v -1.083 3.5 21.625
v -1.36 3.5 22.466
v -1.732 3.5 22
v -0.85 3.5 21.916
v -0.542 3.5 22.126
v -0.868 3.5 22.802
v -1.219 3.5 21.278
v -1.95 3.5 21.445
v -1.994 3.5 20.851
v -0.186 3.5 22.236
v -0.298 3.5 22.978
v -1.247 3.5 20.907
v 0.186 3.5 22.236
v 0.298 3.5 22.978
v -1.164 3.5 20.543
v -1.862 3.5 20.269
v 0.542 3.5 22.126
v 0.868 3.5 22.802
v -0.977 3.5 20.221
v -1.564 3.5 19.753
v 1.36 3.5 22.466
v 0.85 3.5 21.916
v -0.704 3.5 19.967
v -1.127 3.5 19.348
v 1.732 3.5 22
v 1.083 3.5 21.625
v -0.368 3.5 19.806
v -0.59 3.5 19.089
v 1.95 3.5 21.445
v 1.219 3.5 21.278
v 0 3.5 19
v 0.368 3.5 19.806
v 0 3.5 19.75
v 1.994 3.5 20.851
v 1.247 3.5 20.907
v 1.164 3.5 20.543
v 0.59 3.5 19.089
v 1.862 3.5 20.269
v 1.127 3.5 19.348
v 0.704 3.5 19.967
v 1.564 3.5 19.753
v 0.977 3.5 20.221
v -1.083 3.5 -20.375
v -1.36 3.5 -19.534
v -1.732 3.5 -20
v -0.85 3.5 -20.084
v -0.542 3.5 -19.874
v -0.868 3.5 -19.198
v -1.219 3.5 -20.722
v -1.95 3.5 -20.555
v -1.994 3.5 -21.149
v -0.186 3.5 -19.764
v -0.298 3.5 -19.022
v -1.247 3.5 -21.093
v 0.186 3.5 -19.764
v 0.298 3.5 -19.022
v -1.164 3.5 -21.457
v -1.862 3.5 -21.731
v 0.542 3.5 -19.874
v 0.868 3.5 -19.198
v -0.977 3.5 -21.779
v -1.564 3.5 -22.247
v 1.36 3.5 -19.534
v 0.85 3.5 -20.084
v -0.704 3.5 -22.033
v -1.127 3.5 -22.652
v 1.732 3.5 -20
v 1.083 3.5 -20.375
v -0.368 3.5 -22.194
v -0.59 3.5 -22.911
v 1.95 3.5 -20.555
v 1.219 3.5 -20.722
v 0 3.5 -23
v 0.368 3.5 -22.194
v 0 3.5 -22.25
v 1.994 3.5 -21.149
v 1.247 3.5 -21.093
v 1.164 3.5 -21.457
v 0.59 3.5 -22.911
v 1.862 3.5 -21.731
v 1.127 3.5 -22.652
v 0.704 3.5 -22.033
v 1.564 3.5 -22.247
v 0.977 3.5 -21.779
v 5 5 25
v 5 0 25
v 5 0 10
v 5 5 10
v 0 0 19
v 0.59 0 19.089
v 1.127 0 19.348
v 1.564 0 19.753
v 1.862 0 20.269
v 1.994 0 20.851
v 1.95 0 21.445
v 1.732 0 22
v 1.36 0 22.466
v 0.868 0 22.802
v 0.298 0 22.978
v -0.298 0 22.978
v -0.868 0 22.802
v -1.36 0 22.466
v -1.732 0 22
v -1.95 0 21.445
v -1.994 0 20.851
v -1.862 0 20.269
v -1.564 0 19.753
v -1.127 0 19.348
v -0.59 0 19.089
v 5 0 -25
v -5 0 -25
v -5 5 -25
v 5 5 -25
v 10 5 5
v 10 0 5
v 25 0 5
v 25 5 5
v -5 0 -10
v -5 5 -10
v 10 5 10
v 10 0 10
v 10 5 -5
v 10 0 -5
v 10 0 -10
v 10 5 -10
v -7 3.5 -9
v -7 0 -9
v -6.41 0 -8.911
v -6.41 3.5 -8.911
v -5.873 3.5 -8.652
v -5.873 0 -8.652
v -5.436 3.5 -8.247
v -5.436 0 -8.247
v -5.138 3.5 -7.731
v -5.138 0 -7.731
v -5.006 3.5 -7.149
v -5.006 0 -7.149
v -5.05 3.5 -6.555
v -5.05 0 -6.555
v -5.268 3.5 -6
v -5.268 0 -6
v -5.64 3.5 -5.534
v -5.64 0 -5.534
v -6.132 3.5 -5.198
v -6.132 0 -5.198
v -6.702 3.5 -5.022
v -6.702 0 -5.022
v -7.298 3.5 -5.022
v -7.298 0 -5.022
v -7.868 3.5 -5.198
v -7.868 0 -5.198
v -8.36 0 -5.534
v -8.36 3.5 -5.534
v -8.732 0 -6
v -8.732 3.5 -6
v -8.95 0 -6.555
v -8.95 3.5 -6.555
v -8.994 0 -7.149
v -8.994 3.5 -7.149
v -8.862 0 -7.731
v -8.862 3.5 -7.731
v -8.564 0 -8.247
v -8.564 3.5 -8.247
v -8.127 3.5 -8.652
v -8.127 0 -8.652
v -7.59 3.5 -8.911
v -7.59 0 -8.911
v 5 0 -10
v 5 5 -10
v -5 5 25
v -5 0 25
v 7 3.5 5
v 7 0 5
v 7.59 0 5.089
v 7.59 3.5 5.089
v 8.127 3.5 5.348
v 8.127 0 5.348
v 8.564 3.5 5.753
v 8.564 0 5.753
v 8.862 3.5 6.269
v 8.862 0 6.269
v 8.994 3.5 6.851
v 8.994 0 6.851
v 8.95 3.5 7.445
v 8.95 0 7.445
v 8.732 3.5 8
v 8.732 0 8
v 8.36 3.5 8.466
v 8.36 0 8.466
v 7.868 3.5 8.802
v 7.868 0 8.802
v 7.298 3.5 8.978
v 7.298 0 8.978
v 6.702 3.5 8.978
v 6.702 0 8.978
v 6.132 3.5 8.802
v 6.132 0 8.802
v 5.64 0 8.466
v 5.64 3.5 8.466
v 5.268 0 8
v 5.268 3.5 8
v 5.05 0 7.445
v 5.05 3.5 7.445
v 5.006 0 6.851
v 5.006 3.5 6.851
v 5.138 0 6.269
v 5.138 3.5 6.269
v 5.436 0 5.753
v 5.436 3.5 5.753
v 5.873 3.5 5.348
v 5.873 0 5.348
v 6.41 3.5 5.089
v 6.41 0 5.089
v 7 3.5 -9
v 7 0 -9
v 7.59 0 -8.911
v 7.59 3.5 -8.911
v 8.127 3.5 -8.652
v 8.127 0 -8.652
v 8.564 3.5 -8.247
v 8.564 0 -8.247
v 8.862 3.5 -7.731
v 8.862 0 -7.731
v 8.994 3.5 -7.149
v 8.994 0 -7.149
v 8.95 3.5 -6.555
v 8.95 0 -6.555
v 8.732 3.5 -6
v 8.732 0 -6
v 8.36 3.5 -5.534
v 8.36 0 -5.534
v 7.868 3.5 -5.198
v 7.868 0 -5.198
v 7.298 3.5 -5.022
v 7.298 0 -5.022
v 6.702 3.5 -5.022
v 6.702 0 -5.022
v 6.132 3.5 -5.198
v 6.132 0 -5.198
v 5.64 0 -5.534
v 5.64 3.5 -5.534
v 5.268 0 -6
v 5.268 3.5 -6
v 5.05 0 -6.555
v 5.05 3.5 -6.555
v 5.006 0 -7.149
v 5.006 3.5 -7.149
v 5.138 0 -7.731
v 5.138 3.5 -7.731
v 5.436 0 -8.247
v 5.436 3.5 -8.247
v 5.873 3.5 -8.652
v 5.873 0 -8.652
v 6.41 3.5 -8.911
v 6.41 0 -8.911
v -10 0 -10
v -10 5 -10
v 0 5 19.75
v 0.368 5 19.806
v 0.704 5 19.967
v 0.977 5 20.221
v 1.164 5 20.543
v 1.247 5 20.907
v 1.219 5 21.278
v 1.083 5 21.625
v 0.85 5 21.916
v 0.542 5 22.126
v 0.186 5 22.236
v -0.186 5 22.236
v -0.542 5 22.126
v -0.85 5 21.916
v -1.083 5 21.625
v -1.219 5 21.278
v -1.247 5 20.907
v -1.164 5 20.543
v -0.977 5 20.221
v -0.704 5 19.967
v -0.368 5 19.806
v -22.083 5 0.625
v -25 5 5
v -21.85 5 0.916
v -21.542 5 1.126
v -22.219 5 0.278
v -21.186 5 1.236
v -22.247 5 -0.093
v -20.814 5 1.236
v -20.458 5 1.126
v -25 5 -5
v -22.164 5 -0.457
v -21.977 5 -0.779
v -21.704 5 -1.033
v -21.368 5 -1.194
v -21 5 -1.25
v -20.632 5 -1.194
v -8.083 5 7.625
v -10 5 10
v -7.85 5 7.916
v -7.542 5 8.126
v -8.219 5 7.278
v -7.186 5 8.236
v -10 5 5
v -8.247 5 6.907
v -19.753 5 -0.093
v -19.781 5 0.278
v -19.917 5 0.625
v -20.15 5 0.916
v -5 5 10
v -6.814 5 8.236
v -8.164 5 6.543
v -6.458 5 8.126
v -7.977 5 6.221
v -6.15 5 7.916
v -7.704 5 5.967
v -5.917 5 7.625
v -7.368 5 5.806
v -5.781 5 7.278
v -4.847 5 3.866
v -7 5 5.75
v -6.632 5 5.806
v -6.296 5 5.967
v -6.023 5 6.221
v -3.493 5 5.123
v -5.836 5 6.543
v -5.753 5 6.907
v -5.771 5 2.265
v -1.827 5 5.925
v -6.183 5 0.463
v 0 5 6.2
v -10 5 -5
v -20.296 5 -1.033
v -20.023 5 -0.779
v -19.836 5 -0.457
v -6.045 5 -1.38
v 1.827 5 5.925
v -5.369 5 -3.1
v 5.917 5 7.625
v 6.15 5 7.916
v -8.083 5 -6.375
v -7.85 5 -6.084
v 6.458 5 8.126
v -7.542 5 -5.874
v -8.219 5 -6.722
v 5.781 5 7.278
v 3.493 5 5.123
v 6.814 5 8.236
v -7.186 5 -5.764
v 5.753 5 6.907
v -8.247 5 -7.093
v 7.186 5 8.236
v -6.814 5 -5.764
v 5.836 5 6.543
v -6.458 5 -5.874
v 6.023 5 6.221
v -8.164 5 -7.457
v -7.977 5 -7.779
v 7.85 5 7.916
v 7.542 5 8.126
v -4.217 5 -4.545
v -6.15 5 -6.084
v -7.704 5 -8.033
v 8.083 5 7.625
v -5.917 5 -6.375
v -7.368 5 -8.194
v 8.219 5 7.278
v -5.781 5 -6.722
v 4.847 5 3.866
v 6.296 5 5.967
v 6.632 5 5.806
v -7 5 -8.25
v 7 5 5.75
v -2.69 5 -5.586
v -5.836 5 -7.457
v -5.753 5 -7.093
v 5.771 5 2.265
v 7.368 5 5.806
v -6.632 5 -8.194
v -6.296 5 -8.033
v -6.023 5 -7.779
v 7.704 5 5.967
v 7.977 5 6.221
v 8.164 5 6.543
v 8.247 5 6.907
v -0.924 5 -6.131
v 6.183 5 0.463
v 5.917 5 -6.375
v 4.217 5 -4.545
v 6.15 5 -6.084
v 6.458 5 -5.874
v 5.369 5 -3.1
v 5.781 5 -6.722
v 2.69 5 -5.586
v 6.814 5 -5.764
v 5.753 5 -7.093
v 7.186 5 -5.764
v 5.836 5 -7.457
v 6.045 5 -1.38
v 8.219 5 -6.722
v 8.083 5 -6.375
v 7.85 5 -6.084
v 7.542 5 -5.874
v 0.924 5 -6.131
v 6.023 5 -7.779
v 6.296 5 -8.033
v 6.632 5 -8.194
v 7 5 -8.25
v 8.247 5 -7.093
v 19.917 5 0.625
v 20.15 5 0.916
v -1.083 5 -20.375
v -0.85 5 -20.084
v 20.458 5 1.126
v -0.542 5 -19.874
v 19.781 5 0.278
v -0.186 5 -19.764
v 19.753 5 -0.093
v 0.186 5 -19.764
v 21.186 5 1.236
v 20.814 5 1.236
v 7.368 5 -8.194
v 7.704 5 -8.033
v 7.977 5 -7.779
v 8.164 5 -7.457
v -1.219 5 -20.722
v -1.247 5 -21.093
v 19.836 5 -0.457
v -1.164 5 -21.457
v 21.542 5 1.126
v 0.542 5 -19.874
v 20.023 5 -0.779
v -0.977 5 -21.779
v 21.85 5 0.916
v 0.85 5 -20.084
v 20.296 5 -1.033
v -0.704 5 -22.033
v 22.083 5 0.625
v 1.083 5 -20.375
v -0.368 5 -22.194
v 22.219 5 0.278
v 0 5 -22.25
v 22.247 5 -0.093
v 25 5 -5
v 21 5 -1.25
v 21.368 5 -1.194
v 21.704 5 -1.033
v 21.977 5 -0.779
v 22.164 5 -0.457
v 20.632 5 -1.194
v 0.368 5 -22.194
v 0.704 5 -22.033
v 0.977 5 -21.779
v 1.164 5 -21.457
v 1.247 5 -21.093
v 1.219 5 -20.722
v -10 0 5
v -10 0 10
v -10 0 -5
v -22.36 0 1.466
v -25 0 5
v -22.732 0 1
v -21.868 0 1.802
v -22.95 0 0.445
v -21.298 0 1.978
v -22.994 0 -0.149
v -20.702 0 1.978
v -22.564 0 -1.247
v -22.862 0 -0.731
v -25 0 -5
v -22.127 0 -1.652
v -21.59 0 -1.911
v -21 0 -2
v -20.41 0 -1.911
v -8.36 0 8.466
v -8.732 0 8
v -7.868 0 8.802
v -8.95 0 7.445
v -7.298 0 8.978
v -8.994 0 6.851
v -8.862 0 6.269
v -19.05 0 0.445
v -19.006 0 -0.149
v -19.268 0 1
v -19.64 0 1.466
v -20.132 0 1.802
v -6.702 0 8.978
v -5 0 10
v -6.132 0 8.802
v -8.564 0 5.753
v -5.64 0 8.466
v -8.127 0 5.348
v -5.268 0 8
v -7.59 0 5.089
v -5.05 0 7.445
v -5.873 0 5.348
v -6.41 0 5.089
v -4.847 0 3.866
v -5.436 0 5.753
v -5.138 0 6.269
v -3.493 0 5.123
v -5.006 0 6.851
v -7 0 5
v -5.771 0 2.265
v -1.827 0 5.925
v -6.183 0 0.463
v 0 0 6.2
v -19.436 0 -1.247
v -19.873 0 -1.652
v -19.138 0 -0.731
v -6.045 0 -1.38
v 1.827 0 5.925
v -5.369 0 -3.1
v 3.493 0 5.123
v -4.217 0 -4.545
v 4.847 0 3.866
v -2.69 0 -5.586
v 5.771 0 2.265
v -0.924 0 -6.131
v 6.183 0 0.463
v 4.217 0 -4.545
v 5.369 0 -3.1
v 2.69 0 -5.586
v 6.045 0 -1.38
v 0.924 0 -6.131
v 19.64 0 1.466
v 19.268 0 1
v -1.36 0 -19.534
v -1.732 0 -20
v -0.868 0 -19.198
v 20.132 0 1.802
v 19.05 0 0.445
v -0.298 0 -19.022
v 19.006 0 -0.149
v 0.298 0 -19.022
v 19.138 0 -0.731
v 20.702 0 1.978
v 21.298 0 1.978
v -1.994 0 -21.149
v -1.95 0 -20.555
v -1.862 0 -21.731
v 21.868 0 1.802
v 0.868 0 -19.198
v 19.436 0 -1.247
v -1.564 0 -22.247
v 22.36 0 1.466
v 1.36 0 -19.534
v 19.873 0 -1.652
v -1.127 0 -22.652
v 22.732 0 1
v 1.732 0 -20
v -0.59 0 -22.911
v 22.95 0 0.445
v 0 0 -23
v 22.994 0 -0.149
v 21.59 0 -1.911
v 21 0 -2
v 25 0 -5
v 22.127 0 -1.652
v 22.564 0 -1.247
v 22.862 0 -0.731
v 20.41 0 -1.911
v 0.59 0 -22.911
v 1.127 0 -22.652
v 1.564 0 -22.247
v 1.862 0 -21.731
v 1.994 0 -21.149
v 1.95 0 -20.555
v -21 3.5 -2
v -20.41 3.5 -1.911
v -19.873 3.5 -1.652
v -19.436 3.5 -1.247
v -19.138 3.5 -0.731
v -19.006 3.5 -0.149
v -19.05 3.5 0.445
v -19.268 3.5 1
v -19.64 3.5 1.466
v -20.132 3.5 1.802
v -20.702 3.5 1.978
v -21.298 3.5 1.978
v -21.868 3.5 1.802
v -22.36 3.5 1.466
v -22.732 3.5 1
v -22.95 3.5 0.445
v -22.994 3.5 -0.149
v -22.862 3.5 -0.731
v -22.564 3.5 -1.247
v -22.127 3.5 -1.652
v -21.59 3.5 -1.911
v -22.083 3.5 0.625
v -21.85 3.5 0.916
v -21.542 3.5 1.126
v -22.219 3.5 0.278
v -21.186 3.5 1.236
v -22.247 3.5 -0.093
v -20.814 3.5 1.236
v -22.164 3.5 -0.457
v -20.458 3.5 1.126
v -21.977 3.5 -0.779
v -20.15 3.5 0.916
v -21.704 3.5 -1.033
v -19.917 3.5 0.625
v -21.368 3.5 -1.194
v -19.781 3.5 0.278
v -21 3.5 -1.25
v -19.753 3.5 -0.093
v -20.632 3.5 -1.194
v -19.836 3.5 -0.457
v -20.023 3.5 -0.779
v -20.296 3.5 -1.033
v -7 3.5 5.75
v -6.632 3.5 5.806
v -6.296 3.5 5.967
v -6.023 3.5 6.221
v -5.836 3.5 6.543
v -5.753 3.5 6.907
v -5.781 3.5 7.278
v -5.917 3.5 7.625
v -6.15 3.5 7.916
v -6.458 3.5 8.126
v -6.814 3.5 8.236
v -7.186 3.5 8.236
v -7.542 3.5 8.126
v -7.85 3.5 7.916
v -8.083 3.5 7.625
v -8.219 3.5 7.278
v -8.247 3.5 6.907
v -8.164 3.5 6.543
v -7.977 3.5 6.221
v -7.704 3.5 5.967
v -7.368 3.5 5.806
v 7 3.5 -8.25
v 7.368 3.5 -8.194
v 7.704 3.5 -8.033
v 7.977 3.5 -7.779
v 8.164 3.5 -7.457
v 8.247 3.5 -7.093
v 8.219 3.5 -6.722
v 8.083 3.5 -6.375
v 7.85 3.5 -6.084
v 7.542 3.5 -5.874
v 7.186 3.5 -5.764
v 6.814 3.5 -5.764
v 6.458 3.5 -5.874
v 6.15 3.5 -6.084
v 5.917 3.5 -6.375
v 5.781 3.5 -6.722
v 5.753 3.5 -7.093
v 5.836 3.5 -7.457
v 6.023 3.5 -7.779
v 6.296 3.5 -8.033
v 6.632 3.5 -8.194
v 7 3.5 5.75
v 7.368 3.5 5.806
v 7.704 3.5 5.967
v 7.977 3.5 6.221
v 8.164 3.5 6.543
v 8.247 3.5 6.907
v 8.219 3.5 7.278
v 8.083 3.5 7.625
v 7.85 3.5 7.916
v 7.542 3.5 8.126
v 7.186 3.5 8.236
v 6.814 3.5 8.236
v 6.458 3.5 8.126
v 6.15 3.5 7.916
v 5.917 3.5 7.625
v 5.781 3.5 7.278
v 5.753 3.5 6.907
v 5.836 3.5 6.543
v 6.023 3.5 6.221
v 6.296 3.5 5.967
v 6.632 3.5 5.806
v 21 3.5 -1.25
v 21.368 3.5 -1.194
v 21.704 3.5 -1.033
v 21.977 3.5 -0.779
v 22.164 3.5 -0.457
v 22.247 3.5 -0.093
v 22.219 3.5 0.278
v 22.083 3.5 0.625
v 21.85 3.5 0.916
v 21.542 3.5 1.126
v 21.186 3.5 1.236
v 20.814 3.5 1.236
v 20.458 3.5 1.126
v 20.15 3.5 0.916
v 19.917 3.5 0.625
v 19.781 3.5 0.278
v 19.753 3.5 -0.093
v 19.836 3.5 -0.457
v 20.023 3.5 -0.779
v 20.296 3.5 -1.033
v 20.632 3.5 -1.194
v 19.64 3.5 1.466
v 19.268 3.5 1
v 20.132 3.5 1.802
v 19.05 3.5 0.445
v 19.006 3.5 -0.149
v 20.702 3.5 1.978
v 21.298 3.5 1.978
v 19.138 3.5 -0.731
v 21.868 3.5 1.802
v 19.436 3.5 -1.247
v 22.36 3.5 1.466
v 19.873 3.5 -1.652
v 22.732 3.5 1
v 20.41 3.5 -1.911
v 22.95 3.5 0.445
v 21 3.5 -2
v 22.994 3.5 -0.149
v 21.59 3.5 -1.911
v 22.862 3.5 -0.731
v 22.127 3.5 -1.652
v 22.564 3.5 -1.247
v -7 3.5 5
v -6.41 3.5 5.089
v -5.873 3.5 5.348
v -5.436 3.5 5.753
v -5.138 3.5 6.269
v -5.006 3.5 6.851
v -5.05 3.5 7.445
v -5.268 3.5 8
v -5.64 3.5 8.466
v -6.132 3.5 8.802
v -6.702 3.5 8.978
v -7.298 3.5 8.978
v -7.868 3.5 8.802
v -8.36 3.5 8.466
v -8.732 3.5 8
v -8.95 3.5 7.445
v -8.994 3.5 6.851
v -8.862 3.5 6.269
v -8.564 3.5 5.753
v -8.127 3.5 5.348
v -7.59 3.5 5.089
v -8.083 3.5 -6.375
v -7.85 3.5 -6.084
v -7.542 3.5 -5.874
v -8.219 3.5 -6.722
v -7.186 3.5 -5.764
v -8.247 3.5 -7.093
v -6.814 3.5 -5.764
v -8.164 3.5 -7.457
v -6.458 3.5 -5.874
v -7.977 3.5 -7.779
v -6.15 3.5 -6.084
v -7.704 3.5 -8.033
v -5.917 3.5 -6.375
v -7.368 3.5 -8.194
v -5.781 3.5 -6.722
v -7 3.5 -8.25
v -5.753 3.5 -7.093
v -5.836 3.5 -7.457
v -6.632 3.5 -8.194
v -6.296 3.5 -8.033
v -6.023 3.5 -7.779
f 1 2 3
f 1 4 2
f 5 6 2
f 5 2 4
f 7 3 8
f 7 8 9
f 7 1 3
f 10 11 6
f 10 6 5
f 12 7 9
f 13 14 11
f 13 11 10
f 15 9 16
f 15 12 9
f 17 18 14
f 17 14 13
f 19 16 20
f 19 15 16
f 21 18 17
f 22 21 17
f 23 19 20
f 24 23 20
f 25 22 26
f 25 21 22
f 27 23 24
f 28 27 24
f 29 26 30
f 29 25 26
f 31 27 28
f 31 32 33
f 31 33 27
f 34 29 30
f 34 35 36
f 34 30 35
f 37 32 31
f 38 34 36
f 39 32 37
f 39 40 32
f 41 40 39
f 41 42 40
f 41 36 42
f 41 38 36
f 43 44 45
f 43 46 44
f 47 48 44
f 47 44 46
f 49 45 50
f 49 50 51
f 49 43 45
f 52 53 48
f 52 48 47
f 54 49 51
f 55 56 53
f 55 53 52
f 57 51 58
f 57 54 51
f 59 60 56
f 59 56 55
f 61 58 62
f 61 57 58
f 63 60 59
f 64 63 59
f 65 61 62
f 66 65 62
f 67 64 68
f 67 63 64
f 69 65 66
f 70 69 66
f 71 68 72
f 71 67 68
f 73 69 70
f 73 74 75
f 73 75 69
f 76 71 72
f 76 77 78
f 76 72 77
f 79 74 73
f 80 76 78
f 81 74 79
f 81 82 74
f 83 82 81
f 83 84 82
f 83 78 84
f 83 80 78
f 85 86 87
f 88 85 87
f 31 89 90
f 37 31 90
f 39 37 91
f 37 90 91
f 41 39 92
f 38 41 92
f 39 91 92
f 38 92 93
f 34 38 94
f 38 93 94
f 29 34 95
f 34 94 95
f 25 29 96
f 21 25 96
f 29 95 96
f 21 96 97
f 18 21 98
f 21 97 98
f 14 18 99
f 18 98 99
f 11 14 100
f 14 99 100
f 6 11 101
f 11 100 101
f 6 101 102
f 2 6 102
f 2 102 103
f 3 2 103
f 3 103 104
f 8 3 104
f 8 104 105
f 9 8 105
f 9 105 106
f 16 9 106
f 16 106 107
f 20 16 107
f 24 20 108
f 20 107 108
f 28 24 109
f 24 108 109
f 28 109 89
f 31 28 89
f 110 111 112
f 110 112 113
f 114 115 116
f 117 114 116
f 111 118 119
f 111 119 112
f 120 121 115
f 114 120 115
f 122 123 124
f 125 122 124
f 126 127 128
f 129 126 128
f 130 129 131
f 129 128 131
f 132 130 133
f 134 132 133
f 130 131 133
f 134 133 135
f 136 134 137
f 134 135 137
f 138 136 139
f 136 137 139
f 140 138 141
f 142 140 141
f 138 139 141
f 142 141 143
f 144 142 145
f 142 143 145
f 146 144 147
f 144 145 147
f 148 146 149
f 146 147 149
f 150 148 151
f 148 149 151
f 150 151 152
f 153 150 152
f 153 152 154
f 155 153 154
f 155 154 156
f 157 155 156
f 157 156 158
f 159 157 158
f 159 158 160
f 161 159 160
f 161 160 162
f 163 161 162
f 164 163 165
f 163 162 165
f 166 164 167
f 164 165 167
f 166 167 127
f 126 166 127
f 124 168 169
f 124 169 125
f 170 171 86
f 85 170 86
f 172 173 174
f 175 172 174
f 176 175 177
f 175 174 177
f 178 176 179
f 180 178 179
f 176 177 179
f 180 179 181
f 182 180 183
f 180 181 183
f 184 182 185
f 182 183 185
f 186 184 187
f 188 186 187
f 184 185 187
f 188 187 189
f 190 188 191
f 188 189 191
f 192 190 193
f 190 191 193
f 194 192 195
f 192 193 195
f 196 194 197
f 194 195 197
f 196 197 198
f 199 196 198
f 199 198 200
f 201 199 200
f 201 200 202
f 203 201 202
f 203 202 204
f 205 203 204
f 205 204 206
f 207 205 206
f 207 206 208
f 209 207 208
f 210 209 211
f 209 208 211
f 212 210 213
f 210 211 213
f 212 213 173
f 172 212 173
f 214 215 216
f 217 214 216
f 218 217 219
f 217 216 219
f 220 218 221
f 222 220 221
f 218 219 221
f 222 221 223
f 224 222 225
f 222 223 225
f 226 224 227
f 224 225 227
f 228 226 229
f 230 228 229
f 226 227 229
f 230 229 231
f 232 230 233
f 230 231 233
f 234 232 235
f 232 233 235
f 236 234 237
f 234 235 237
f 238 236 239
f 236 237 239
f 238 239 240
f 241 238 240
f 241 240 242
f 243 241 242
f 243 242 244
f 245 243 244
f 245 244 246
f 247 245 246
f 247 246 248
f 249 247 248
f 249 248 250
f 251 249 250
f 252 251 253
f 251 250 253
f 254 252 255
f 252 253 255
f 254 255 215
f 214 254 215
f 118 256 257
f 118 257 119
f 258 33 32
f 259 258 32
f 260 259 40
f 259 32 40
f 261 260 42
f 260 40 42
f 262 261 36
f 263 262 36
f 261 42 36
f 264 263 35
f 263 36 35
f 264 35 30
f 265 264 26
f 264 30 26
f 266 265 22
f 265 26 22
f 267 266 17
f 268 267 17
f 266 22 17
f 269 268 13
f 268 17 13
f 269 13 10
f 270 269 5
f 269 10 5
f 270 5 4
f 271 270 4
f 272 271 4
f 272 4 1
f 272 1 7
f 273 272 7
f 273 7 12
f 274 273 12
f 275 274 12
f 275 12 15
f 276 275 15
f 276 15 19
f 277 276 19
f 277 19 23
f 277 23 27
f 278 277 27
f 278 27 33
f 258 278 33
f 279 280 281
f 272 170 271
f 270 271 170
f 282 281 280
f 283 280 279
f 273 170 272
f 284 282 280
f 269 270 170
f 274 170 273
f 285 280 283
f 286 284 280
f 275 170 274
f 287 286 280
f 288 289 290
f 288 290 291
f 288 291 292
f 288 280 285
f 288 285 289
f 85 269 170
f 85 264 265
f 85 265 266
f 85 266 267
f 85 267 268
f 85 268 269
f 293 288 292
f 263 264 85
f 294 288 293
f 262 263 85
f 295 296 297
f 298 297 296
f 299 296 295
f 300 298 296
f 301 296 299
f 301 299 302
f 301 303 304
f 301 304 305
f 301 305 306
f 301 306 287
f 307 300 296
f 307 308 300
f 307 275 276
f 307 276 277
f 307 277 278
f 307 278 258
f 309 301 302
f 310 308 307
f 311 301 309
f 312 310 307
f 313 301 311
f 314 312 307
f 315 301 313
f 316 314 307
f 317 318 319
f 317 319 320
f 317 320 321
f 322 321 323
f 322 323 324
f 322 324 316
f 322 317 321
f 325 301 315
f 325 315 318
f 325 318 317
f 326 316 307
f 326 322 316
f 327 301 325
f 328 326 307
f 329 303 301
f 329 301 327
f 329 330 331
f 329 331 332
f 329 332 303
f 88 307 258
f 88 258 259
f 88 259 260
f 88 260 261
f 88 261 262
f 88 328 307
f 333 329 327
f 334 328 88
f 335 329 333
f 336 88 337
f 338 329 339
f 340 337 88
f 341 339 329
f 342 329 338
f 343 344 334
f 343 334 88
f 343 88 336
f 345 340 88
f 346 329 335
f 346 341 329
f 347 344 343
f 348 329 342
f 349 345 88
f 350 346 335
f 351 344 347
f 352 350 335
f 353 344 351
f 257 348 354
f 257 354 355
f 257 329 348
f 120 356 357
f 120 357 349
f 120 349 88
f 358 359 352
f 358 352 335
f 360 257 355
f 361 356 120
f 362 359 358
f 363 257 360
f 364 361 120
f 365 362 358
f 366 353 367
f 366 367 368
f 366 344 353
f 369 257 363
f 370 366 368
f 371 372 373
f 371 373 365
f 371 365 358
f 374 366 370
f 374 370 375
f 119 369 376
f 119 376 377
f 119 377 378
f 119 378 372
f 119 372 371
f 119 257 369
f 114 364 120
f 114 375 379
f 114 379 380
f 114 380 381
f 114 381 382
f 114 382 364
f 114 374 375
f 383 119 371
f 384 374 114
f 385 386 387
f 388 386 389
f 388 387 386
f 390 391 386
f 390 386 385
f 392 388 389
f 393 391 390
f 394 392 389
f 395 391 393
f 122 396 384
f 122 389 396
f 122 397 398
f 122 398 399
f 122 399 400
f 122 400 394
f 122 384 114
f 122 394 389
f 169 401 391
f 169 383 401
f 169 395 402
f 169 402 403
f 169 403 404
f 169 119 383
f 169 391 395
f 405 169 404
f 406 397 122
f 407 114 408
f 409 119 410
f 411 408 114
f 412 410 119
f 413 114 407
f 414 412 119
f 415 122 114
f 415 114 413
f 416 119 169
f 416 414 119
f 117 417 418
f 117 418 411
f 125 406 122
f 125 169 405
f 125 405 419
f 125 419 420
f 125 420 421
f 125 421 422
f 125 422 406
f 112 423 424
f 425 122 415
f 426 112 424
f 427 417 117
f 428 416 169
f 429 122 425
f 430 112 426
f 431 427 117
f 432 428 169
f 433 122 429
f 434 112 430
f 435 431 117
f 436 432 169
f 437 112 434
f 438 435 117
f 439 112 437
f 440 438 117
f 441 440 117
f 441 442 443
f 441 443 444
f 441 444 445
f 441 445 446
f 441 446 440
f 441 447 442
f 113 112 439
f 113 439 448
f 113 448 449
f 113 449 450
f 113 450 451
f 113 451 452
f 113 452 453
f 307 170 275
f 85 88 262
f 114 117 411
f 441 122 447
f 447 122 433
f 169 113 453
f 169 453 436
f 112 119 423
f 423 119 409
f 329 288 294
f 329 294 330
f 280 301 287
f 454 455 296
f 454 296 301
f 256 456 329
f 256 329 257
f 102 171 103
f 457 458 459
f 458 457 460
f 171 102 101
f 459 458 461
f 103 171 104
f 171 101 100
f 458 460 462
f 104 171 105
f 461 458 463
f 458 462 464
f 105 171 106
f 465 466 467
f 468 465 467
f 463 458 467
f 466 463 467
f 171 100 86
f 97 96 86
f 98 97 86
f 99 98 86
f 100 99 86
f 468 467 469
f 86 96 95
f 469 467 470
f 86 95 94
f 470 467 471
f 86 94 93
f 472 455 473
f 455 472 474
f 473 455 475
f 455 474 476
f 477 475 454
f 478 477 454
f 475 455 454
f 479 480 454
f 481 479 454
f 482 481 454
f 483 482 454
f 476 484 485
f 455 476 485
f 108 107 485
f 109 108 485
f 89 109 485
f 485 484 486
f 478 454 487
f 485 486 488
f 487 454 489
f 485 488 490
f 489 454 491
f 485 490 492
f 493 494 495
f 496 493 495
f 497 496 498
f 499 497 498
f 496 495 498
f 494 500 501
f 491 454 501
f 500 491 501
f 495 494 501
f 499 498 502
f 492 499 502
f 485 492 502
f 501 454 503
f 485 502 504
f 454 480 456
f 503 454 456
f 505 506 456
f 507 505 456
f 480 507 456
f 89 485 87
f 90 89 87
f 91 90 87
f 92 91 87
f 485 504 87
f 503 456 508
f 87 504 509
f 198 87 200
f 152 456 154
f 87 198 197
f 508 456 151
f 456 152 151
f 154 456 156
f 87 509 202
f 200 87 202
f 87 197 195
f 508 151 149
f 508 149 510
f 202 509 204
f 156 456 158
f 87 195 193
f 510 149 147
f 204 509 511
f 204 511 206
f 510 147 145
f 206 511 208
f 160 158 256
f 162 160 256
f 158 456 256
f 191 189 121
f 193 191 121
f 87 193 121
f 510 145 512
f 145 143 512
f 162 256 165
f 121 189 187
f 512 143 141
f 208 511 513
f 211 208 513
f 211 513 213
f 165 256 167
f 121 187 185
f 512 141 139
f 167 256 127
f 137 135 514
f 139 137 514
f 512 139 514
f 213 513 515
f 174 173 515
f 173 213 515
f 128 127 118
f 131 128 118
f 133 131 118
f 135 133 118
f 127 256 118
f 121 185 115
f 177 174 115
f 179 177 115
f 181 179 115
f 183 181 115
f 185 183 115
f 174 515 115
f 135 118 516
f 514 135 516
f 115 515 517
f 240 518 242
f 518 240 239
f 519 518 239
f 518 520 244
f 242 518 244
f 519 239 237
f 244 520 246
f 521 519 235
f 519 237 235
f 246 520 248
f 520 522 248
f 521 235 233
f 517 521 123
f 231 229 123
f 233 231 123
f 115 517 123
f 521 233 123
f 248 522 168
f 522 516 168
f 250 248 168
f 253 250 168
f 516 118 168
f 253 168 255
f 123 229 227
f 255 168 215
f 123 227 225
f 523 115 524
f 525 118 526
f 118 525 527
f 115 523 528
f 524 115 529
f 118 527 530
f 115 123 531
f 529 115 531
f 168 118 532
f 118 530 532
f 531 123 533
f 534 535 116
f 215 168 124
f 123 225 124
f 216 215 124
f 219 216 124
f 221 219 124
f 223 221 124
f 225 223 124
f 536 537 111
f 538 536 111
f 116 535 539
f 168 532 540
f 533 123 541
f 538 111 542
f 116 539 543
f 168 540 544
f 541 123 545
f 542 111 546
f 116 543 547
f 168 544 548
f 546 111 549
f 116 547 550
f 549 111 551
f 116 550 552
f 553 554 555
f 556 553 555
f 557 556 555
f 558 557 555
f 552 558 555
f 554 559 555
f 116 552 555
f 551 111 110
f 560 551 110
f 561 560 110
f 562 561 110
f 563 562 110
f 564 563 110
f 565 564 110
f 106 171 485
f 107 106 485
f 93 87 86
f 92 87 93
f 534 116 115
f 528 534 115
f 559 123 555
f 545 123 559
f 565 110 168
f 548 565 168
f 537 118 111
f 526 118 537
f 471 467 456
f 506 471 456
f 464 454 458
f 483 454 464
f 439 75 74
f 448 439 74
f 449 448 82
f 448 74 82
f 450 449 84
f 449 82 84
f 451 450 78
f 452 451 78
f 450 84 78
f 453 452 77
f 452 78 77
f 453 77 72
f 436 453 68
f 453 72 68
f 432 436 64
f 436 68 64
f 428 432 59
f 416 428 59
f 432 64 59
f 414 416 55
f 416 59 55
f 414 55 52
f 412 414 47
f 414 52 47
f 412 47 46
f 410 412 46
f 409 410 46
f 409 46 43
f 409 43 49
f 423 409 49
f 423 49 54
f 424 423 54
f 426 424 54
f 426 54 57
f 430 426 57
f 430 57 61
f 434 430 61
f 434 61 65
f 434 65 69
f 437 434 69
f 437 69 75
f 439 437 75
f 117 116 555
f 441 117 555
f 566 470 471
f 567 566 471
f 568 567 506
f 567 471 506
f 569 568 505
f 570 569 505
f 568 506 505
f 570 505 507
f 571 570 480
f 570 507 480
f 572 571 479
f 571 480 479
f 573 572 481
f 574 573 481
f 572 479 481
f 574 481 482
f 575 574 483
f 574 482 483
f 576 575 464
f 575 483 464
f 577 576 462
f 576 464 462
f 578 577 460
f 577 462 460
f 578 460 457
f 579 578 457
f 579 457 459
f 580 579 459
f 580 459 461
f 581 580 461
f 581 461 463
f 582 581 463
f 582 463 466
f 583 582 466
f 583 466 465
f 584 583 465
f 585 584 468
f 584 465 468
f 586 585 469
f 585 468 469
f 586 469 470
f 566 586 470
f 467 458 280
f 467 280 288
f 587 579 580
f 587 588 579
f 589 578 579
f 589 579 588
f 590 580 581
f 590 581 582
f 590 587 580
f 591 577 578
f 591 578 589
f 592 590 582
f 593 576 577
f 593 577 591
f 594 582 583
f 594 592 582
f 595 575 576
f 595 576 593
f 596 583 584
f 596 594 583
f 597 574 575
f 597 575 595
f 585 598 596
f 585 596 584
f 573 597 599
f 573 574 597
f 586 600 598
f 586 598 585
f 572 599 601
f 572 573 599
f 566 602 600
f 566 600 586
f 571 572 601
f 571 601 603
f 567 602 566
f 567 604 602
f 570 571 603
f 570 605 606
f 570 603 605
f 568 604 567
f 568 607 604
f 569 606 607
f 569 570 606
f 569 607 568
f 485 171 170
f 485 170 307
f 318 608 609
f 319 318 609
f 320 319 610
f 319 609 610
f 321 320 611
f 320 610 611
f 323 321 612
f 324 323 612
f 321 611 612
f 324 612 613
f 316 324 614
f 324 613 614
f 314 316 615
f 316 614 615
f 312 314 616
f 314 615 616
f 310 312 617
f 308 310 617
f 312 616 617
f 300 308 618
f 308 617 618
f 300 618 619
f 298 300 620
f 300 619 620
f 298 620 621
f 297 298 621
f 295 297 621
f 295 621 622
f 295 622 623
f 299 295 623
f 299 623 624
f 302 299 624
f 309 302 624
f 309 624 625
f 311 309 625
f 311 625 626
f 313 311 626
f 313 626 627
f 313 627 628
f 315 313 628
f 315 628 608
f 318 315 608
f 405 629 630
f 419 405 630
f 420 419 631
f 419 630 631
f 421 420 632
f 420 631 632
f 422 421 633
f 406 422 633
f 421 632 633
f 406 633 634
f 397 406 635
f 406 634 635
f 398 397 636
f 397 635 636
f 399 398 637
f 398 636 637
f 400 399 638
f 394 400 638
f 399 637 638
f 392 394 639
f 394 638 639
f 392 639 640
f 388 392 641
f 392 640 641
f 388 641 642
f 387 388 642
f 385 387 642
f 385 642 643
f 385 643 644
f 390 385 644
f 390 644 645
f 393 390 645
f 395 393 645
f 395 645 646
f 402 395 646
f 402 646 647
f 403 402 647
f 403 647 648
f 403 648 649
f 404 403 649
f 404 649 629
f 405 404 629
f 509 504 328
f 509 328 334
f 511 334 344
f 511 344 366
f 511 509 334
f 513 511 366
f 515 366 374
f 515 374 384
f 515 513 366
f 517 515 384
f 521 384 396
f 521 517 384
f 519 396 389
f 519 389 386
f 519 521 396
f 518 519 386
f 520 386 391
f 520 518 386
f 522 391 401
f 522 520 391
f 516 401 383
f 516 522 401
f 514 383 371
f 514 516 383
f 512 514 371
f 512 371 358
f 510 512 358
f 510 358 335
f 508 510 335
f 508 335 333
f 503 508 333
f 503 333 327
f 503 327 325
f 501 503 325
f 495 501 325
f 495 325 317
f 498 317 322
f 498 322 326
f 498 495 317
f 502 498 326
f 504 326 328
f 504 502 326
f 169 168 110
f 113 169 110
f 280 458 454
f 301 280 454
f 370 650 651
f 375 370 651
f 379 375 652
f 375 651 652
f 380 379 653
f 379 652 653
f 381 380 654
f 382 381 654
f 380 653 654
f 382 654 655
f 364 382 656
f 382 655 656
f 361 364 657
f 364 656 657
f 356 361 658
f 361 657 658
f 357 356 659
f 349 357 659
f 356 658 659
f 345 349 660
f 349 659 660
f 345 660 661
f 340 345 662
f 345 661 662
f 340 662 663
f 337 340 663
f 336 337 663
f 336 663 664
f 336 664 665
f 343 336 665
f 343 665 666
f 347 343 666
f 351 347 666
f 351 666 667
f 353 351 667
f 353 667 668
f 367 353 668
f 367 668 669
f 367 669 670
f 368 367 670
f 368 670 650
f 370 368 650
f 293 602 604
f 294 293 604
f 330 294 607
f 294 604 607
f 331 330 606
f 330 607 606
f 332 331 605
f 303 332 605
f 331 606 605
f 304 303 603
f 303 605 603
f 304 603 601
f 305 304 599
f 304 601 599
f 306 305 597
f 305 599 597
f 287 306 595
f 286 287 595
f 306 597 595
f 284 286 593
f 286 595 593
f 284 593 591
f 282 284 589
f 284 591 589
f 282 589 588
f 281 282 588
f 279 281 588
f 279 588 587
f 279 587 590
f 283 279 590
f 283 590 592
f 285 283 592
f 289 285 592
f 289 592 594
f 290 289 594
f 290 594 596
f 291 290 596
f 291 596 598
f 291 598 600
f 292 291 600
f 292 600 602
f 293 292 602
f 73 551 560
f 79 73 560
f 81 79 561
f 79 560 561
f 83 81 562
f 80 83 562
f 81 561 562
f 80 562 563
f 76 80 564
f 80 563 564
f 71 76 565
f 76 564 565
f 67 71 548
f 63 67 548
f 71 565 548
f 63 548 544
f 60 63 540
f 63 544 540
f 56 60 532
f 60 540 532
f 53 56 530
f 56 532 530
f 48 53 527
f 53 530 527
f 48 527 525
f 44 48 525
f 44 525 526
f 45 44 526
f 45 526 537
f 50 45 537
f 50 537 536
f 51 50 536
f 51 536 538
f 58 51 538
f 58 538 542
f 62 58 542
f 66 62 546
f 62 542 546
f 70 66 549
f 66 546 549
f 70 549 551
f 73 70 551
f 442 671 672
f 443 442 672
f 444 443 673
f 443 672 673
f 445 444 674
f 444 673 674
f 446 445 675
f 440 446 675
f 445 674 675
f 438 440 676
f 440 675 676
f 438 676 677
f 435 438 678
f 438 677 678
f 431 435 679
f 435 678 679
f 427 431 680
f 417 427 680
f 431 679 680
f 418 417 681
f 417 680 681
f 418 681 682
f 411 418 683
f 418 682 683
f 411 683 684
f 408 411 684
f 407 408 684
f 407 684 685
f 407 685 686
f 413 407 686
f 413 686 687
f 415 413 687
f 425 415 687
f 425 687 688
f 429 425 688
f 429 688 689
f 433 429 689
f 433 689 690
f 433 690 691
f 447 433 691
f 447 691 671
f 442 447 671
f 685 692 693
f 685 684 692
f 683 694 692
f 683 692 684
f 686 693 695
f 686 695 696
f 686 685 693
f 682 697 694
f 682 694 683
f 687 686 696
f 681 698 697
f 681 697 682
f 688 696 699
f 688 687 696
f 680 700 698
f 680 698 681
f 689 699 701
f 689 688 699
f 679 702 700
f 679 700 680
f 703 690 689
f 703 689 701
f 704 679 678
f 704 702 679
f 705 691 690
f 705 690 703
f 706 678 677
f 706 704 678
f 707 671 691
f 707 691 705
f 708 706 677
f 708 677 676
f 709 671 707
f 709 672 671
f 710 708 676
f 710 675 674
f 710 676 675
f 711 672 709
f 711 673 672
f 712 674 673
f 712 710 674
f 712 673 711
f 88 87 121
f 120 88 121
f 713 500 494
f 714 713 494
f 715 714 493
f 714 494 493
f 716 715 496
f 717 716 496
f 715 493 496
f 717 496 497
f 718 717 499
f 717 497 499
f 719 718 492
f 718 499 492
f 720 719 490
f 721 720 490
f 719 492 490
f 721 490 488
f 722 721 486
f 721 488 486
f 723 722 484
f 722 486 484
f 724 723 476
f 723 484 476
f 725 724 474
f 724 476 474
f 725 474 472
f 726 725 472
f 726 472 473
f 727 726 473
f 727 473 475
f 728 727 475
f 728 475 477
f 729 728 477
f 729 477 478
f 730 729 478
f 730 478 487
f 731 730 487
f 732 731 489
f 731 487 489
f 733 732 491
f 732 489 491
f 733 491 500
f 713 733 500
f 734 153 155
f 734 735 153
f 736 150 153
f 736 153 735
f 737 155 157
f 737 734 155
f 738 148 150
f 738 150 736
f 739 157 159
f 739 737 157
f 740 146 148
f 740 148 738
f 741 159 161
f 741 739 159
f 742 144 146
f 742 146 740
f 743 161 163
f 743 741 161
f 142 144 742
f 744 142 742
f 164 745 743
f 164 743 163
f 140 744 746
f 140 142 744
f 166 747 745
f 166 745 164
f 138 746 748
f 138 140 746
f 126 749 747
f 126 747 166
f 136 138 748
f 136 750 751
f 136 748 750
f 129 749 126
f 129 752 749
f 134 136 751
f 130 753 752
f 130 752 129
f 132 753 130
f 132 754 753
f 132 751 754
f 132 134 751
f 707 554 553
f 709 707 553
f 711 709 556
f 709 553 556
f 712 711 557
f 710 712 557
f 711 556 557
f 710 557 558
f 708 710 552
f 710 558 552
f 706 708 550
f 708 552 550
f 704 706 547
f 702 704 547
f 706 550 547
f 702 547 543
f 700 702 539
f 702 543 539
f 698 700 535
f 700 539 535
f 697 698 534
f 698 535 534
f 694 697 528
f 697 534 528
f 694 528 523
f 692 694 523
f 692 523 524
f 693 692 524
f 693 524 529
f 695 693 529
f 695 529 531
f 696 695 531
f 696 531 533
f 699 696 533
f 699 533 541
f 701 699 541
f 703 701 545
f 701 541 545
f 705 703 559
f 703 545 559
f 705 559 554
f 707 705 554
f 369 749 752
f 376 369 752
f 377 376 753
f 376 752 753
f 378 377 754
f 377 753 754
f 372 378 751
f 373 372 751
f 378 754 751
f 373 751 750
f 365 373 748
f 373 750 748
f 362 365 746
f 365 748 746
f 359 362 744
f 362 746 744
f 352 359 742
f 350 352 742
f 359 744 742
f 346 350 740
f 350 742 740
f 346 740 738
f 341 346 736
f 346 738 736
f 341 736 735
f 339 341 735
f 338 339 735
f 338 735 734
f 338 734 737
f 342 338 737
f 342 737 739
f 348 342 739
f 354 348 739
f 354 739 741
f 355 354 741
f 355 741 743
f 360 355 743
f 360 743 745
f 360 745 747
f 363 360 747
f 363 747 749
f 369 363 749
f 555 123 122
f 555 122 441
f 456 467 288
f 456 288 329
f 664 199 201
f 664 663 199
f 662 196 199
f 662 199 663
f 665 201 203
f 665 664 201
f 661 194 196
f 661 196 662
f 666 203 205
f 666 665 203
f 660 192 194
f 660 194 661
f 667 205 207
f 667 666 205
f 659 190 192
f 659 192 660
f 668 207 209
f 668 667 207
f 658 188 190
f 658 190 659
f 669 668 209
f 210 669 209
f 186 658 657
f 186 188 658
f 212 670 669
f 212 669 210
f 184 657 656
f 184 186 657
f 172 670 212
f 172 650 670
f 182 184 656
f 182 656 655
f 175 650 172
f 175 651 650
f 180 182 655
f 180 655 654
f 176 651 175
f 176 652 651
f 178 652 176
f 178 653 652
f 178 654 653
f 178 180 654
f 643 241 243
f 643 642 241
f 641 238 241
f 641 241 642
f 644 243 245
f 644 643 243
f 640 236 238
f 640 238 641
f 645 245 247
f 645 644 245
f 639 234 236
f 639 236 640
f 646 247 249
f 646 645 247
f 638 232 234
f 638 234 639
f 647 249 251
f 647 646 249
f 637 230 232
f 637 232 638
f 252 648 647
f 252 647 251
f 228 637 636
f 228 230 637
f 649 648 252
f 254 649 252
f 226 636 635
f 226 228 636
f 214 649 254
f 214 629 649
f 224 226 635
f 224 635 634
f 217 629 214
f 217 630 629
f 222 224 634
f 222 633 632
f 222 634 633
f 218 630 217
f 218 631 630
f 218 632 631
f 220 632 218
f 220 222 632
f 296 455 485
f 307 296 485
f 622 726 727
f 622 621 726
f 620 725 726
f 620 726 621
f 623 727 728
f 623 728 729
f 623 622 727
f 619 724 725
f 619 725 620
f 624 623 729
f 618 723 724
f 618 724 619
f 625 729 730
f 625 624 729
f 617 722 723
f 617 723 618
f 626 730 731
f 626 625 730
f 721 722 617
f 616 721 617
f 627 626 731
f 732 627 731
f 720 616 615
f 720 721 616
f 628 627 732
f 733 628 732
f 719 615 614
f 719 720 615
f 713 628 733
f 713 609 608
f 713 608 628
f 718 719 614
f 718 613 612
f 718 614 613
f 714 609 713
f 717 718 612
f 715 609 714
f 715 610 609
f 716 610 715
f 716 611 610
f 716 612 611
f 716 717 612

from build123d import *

# Parameters (mm, degrees)
SKETCH_1_W          = 20
SKETCH_1_H          = 20
SKETCH_1_R          = 6.2
SKETCH_1_W_2        = 15
SKETCH_1_H_2        = 10
SKETCH_1_W_3        = 10
SKETCH_1_H_3        = 15
EXTRUDE_1_DEPTH     = 5
SKETCH_2_R          = 1.25
CUT_EXTRUDE_1_DEPTH = 36.707142143
SKETCH_2_3_R        = 2
SKETCH_2_3_R_2      = 1.25
CUT_EXTRUDE_2_DEPTH = 3.5


with BuildPart() as part:
    # 草图1 → 凸台-拉伸1 (new body)
    # profile 1 of 5: a face of its own
    with BuildSketch(Plane(origin=(0, 0, 0), x_dir=(1, 0, 0), z_dir=(0, 1, 0))):
        Rectangle(SKETCH_1_W, SKETCH_1_H)
        with Locations(Location((0, 0, 0), (0, 0, 270))):
            Circle(SKETCH_1_R, mode=Mode.SUBTRACT)
    # profile 2 of 5: a face of its own
    with BuildSketch(Plane(origin=(0, 0, 0), x_dir=(1, 0, 0), z_dir=(0, 1, 0))):
        with Locations((-17.5, 0)):
            Rectangle(SKETCH_1_W_2, SKETCH_1_H_2)
    # profile 3 of 5: a face of its own
    with BuildSketch(Plane(origin=(0, 0, 0), x_dir=(1, 0, 0), z_dir=(0, 1, 0))):
        with Locations((0, -17.5)):
            Rectangle(SKETCH_1_W_3, SKETCH_1_H_3)
    # profile 4 of 5: a face of its own
    with BuildSketch(Plane(origin=(0, 0, 0), x_dir=(1, 0, 0), z_dir=(0, 1, 0))):
        with Locations((0, 17.5)):
            Rectangle(SKETCH_1_W_3, SKETCH_1_H_3)
    # profile 5 of 5: a face of its own
    with BuildSketch(Plane(origin=(0, 0, 0), x_dir=(1, 0, 0), z_dir=(0, 1, 0))):
        with Locations((17.5, 0)):
            Rectangle(SKETCH_1_W_2, SKETCH_1_H_2)
    extrude(amount=EXTRUDE_1_DEPTH)

    # 草图2 → 切除-拉伸1 (cut, through all)
    with BuildSketch(Plane.XZ):
        with Locations(Location((7, 7, 0), (0, 0, 270))):
            Circle(SKETCH_2_R)
        with Locations(Location((7, -7, 0), (0, 0, 270))):
            Circle(SKETCH_2_R)
        with Locations(Location((-7, -7, 0), (0, 0, 270))):
            Circle(SKETCH_2_R)
        with Locations(Location((-7, 7, 0), (0, 0, 270))):
            Circle(SKETCH_2_R)
        with Locations(Location((0, 21, 0), (0, 0, 270))):
            Circle(SKETCH_2_R)
        with Locations(Location((21, 0, 0), (0, 0, 270))):
            Circle(SKETCH_2_R)
        with Locations(Location((0, -21, 0), (0, 0, 270))):
            Circle(SKETCH_2_R)
        with Locations(Location((-21, 0, 0), (0, 0, 270))):
            Circle(SKETCH_2_R)
    extrude(amount=-CUT_EXTRUDE_1_DEPTH, mode=Mode.SUBTRACT)

    # 草图2<3> → 切除-拉伸2 (cut)
    # profile 1 of 8: a face of its own
    with BuildSketch(Plane.XZ):
        with Locations(Location((7, 7, 0), (0, 0, 270))):
            Circle(SKETCH_2_3_R)
        with Locations(Location((7, 7, 0), (0, 0, 270))):
            Circle(SKETCH_2_3_R_2, mode=Mode.SUBTRACT)
    # profile 2 of 8: a face of its own
    with BuildSketch(Plane.XZ):
        with Locations(Location((7, -7, 0), (0, 0, 270))):
            Circle(SKETCH_2_3_R)
        with Locations(Location((7, -7, 0), (0, 0, 270))):
            Circle(SKETCH_2_3_R_2, mode=Mode.SUBTRACT)
    # profile 3 of 8: a face of its own
    with BuildSketch(Plane.XZ):
        with Locations(Location((-7, 7, 0), (0, 0, 270))):
            Circle(SKETCH_2_3_R)
        with Locations(Location((-7, 7, 0), (0, 0, 270))):
            Circle(SKETCH_2_3_R_2, mode=Mode.SUBTRACT)
    # profile 4 of 8: a face of its own
    with BuildSketch(Plane.XZ):
        with Locations(Location((-7, -7, 0), (0, 0, 270))):
            Circle(SKETCH_2_3_R)
        with Locations(Location((-7, -7, 0), (0, 0, 270))):
            Circle(SKETCH_2_3_R_2, mode=Mode.SUBTRACT)
    # profile 5 of 8: a face of its own
    with BuildSketch(Plane.XZ):
        with Locations(Location((0, 21, 0), (0, 0, 270))):
            Circle(SKETCH_2_3_R)
        with Locations(Location((0, 21, 0), (0, 0, 270))):
            Circle(SKETCH_2_3_R_2, mode=Mode.SUBTRACT)
    # profile 6 of 8: a face of its own
    with BuildSketch(Plane.XZ):
        with Locations(Location((21, 0, 0), (0, 0, 270))):
            Circle(SKETCH_2_3_R)
        with Locations(Location((21, 0, 0), (0, 0, 270))):
            Circle(SKETCH_2_3_R_2, mode=Mode.SUBTRACT)
    # profile 7 of 8: a face of its own
    with BuildSketch(Plane.XZ):
        with Locations(Location((0, -21, 0), (0, 0, 270))):
            Circle(SKETCH_2_3_R)
        with Locations(Location((0, -21, 0), (0, 0, 270))):
            Circle(SKETCH_2_3_R_2, mode=Mode.SUBTRACT)
    # profile 8 of 8: a face of its own
    with BuildSketch(Plane.XZ):
        with Locations(Location((-21, 0, 0), (0, 0, 270))):
            Circle(SKETCH_2_3_R)
        with Locations(Location((-21, 0, 0), (0, 0, 270))):
            Circle(SKETCH_2_3_R_2, mode=Mode.SUBTRACT)
    extrude(amount=-CUT_EXTRUDE_2_DEPTH, mode=Mode.SUBTRACT)


solid = part.part
